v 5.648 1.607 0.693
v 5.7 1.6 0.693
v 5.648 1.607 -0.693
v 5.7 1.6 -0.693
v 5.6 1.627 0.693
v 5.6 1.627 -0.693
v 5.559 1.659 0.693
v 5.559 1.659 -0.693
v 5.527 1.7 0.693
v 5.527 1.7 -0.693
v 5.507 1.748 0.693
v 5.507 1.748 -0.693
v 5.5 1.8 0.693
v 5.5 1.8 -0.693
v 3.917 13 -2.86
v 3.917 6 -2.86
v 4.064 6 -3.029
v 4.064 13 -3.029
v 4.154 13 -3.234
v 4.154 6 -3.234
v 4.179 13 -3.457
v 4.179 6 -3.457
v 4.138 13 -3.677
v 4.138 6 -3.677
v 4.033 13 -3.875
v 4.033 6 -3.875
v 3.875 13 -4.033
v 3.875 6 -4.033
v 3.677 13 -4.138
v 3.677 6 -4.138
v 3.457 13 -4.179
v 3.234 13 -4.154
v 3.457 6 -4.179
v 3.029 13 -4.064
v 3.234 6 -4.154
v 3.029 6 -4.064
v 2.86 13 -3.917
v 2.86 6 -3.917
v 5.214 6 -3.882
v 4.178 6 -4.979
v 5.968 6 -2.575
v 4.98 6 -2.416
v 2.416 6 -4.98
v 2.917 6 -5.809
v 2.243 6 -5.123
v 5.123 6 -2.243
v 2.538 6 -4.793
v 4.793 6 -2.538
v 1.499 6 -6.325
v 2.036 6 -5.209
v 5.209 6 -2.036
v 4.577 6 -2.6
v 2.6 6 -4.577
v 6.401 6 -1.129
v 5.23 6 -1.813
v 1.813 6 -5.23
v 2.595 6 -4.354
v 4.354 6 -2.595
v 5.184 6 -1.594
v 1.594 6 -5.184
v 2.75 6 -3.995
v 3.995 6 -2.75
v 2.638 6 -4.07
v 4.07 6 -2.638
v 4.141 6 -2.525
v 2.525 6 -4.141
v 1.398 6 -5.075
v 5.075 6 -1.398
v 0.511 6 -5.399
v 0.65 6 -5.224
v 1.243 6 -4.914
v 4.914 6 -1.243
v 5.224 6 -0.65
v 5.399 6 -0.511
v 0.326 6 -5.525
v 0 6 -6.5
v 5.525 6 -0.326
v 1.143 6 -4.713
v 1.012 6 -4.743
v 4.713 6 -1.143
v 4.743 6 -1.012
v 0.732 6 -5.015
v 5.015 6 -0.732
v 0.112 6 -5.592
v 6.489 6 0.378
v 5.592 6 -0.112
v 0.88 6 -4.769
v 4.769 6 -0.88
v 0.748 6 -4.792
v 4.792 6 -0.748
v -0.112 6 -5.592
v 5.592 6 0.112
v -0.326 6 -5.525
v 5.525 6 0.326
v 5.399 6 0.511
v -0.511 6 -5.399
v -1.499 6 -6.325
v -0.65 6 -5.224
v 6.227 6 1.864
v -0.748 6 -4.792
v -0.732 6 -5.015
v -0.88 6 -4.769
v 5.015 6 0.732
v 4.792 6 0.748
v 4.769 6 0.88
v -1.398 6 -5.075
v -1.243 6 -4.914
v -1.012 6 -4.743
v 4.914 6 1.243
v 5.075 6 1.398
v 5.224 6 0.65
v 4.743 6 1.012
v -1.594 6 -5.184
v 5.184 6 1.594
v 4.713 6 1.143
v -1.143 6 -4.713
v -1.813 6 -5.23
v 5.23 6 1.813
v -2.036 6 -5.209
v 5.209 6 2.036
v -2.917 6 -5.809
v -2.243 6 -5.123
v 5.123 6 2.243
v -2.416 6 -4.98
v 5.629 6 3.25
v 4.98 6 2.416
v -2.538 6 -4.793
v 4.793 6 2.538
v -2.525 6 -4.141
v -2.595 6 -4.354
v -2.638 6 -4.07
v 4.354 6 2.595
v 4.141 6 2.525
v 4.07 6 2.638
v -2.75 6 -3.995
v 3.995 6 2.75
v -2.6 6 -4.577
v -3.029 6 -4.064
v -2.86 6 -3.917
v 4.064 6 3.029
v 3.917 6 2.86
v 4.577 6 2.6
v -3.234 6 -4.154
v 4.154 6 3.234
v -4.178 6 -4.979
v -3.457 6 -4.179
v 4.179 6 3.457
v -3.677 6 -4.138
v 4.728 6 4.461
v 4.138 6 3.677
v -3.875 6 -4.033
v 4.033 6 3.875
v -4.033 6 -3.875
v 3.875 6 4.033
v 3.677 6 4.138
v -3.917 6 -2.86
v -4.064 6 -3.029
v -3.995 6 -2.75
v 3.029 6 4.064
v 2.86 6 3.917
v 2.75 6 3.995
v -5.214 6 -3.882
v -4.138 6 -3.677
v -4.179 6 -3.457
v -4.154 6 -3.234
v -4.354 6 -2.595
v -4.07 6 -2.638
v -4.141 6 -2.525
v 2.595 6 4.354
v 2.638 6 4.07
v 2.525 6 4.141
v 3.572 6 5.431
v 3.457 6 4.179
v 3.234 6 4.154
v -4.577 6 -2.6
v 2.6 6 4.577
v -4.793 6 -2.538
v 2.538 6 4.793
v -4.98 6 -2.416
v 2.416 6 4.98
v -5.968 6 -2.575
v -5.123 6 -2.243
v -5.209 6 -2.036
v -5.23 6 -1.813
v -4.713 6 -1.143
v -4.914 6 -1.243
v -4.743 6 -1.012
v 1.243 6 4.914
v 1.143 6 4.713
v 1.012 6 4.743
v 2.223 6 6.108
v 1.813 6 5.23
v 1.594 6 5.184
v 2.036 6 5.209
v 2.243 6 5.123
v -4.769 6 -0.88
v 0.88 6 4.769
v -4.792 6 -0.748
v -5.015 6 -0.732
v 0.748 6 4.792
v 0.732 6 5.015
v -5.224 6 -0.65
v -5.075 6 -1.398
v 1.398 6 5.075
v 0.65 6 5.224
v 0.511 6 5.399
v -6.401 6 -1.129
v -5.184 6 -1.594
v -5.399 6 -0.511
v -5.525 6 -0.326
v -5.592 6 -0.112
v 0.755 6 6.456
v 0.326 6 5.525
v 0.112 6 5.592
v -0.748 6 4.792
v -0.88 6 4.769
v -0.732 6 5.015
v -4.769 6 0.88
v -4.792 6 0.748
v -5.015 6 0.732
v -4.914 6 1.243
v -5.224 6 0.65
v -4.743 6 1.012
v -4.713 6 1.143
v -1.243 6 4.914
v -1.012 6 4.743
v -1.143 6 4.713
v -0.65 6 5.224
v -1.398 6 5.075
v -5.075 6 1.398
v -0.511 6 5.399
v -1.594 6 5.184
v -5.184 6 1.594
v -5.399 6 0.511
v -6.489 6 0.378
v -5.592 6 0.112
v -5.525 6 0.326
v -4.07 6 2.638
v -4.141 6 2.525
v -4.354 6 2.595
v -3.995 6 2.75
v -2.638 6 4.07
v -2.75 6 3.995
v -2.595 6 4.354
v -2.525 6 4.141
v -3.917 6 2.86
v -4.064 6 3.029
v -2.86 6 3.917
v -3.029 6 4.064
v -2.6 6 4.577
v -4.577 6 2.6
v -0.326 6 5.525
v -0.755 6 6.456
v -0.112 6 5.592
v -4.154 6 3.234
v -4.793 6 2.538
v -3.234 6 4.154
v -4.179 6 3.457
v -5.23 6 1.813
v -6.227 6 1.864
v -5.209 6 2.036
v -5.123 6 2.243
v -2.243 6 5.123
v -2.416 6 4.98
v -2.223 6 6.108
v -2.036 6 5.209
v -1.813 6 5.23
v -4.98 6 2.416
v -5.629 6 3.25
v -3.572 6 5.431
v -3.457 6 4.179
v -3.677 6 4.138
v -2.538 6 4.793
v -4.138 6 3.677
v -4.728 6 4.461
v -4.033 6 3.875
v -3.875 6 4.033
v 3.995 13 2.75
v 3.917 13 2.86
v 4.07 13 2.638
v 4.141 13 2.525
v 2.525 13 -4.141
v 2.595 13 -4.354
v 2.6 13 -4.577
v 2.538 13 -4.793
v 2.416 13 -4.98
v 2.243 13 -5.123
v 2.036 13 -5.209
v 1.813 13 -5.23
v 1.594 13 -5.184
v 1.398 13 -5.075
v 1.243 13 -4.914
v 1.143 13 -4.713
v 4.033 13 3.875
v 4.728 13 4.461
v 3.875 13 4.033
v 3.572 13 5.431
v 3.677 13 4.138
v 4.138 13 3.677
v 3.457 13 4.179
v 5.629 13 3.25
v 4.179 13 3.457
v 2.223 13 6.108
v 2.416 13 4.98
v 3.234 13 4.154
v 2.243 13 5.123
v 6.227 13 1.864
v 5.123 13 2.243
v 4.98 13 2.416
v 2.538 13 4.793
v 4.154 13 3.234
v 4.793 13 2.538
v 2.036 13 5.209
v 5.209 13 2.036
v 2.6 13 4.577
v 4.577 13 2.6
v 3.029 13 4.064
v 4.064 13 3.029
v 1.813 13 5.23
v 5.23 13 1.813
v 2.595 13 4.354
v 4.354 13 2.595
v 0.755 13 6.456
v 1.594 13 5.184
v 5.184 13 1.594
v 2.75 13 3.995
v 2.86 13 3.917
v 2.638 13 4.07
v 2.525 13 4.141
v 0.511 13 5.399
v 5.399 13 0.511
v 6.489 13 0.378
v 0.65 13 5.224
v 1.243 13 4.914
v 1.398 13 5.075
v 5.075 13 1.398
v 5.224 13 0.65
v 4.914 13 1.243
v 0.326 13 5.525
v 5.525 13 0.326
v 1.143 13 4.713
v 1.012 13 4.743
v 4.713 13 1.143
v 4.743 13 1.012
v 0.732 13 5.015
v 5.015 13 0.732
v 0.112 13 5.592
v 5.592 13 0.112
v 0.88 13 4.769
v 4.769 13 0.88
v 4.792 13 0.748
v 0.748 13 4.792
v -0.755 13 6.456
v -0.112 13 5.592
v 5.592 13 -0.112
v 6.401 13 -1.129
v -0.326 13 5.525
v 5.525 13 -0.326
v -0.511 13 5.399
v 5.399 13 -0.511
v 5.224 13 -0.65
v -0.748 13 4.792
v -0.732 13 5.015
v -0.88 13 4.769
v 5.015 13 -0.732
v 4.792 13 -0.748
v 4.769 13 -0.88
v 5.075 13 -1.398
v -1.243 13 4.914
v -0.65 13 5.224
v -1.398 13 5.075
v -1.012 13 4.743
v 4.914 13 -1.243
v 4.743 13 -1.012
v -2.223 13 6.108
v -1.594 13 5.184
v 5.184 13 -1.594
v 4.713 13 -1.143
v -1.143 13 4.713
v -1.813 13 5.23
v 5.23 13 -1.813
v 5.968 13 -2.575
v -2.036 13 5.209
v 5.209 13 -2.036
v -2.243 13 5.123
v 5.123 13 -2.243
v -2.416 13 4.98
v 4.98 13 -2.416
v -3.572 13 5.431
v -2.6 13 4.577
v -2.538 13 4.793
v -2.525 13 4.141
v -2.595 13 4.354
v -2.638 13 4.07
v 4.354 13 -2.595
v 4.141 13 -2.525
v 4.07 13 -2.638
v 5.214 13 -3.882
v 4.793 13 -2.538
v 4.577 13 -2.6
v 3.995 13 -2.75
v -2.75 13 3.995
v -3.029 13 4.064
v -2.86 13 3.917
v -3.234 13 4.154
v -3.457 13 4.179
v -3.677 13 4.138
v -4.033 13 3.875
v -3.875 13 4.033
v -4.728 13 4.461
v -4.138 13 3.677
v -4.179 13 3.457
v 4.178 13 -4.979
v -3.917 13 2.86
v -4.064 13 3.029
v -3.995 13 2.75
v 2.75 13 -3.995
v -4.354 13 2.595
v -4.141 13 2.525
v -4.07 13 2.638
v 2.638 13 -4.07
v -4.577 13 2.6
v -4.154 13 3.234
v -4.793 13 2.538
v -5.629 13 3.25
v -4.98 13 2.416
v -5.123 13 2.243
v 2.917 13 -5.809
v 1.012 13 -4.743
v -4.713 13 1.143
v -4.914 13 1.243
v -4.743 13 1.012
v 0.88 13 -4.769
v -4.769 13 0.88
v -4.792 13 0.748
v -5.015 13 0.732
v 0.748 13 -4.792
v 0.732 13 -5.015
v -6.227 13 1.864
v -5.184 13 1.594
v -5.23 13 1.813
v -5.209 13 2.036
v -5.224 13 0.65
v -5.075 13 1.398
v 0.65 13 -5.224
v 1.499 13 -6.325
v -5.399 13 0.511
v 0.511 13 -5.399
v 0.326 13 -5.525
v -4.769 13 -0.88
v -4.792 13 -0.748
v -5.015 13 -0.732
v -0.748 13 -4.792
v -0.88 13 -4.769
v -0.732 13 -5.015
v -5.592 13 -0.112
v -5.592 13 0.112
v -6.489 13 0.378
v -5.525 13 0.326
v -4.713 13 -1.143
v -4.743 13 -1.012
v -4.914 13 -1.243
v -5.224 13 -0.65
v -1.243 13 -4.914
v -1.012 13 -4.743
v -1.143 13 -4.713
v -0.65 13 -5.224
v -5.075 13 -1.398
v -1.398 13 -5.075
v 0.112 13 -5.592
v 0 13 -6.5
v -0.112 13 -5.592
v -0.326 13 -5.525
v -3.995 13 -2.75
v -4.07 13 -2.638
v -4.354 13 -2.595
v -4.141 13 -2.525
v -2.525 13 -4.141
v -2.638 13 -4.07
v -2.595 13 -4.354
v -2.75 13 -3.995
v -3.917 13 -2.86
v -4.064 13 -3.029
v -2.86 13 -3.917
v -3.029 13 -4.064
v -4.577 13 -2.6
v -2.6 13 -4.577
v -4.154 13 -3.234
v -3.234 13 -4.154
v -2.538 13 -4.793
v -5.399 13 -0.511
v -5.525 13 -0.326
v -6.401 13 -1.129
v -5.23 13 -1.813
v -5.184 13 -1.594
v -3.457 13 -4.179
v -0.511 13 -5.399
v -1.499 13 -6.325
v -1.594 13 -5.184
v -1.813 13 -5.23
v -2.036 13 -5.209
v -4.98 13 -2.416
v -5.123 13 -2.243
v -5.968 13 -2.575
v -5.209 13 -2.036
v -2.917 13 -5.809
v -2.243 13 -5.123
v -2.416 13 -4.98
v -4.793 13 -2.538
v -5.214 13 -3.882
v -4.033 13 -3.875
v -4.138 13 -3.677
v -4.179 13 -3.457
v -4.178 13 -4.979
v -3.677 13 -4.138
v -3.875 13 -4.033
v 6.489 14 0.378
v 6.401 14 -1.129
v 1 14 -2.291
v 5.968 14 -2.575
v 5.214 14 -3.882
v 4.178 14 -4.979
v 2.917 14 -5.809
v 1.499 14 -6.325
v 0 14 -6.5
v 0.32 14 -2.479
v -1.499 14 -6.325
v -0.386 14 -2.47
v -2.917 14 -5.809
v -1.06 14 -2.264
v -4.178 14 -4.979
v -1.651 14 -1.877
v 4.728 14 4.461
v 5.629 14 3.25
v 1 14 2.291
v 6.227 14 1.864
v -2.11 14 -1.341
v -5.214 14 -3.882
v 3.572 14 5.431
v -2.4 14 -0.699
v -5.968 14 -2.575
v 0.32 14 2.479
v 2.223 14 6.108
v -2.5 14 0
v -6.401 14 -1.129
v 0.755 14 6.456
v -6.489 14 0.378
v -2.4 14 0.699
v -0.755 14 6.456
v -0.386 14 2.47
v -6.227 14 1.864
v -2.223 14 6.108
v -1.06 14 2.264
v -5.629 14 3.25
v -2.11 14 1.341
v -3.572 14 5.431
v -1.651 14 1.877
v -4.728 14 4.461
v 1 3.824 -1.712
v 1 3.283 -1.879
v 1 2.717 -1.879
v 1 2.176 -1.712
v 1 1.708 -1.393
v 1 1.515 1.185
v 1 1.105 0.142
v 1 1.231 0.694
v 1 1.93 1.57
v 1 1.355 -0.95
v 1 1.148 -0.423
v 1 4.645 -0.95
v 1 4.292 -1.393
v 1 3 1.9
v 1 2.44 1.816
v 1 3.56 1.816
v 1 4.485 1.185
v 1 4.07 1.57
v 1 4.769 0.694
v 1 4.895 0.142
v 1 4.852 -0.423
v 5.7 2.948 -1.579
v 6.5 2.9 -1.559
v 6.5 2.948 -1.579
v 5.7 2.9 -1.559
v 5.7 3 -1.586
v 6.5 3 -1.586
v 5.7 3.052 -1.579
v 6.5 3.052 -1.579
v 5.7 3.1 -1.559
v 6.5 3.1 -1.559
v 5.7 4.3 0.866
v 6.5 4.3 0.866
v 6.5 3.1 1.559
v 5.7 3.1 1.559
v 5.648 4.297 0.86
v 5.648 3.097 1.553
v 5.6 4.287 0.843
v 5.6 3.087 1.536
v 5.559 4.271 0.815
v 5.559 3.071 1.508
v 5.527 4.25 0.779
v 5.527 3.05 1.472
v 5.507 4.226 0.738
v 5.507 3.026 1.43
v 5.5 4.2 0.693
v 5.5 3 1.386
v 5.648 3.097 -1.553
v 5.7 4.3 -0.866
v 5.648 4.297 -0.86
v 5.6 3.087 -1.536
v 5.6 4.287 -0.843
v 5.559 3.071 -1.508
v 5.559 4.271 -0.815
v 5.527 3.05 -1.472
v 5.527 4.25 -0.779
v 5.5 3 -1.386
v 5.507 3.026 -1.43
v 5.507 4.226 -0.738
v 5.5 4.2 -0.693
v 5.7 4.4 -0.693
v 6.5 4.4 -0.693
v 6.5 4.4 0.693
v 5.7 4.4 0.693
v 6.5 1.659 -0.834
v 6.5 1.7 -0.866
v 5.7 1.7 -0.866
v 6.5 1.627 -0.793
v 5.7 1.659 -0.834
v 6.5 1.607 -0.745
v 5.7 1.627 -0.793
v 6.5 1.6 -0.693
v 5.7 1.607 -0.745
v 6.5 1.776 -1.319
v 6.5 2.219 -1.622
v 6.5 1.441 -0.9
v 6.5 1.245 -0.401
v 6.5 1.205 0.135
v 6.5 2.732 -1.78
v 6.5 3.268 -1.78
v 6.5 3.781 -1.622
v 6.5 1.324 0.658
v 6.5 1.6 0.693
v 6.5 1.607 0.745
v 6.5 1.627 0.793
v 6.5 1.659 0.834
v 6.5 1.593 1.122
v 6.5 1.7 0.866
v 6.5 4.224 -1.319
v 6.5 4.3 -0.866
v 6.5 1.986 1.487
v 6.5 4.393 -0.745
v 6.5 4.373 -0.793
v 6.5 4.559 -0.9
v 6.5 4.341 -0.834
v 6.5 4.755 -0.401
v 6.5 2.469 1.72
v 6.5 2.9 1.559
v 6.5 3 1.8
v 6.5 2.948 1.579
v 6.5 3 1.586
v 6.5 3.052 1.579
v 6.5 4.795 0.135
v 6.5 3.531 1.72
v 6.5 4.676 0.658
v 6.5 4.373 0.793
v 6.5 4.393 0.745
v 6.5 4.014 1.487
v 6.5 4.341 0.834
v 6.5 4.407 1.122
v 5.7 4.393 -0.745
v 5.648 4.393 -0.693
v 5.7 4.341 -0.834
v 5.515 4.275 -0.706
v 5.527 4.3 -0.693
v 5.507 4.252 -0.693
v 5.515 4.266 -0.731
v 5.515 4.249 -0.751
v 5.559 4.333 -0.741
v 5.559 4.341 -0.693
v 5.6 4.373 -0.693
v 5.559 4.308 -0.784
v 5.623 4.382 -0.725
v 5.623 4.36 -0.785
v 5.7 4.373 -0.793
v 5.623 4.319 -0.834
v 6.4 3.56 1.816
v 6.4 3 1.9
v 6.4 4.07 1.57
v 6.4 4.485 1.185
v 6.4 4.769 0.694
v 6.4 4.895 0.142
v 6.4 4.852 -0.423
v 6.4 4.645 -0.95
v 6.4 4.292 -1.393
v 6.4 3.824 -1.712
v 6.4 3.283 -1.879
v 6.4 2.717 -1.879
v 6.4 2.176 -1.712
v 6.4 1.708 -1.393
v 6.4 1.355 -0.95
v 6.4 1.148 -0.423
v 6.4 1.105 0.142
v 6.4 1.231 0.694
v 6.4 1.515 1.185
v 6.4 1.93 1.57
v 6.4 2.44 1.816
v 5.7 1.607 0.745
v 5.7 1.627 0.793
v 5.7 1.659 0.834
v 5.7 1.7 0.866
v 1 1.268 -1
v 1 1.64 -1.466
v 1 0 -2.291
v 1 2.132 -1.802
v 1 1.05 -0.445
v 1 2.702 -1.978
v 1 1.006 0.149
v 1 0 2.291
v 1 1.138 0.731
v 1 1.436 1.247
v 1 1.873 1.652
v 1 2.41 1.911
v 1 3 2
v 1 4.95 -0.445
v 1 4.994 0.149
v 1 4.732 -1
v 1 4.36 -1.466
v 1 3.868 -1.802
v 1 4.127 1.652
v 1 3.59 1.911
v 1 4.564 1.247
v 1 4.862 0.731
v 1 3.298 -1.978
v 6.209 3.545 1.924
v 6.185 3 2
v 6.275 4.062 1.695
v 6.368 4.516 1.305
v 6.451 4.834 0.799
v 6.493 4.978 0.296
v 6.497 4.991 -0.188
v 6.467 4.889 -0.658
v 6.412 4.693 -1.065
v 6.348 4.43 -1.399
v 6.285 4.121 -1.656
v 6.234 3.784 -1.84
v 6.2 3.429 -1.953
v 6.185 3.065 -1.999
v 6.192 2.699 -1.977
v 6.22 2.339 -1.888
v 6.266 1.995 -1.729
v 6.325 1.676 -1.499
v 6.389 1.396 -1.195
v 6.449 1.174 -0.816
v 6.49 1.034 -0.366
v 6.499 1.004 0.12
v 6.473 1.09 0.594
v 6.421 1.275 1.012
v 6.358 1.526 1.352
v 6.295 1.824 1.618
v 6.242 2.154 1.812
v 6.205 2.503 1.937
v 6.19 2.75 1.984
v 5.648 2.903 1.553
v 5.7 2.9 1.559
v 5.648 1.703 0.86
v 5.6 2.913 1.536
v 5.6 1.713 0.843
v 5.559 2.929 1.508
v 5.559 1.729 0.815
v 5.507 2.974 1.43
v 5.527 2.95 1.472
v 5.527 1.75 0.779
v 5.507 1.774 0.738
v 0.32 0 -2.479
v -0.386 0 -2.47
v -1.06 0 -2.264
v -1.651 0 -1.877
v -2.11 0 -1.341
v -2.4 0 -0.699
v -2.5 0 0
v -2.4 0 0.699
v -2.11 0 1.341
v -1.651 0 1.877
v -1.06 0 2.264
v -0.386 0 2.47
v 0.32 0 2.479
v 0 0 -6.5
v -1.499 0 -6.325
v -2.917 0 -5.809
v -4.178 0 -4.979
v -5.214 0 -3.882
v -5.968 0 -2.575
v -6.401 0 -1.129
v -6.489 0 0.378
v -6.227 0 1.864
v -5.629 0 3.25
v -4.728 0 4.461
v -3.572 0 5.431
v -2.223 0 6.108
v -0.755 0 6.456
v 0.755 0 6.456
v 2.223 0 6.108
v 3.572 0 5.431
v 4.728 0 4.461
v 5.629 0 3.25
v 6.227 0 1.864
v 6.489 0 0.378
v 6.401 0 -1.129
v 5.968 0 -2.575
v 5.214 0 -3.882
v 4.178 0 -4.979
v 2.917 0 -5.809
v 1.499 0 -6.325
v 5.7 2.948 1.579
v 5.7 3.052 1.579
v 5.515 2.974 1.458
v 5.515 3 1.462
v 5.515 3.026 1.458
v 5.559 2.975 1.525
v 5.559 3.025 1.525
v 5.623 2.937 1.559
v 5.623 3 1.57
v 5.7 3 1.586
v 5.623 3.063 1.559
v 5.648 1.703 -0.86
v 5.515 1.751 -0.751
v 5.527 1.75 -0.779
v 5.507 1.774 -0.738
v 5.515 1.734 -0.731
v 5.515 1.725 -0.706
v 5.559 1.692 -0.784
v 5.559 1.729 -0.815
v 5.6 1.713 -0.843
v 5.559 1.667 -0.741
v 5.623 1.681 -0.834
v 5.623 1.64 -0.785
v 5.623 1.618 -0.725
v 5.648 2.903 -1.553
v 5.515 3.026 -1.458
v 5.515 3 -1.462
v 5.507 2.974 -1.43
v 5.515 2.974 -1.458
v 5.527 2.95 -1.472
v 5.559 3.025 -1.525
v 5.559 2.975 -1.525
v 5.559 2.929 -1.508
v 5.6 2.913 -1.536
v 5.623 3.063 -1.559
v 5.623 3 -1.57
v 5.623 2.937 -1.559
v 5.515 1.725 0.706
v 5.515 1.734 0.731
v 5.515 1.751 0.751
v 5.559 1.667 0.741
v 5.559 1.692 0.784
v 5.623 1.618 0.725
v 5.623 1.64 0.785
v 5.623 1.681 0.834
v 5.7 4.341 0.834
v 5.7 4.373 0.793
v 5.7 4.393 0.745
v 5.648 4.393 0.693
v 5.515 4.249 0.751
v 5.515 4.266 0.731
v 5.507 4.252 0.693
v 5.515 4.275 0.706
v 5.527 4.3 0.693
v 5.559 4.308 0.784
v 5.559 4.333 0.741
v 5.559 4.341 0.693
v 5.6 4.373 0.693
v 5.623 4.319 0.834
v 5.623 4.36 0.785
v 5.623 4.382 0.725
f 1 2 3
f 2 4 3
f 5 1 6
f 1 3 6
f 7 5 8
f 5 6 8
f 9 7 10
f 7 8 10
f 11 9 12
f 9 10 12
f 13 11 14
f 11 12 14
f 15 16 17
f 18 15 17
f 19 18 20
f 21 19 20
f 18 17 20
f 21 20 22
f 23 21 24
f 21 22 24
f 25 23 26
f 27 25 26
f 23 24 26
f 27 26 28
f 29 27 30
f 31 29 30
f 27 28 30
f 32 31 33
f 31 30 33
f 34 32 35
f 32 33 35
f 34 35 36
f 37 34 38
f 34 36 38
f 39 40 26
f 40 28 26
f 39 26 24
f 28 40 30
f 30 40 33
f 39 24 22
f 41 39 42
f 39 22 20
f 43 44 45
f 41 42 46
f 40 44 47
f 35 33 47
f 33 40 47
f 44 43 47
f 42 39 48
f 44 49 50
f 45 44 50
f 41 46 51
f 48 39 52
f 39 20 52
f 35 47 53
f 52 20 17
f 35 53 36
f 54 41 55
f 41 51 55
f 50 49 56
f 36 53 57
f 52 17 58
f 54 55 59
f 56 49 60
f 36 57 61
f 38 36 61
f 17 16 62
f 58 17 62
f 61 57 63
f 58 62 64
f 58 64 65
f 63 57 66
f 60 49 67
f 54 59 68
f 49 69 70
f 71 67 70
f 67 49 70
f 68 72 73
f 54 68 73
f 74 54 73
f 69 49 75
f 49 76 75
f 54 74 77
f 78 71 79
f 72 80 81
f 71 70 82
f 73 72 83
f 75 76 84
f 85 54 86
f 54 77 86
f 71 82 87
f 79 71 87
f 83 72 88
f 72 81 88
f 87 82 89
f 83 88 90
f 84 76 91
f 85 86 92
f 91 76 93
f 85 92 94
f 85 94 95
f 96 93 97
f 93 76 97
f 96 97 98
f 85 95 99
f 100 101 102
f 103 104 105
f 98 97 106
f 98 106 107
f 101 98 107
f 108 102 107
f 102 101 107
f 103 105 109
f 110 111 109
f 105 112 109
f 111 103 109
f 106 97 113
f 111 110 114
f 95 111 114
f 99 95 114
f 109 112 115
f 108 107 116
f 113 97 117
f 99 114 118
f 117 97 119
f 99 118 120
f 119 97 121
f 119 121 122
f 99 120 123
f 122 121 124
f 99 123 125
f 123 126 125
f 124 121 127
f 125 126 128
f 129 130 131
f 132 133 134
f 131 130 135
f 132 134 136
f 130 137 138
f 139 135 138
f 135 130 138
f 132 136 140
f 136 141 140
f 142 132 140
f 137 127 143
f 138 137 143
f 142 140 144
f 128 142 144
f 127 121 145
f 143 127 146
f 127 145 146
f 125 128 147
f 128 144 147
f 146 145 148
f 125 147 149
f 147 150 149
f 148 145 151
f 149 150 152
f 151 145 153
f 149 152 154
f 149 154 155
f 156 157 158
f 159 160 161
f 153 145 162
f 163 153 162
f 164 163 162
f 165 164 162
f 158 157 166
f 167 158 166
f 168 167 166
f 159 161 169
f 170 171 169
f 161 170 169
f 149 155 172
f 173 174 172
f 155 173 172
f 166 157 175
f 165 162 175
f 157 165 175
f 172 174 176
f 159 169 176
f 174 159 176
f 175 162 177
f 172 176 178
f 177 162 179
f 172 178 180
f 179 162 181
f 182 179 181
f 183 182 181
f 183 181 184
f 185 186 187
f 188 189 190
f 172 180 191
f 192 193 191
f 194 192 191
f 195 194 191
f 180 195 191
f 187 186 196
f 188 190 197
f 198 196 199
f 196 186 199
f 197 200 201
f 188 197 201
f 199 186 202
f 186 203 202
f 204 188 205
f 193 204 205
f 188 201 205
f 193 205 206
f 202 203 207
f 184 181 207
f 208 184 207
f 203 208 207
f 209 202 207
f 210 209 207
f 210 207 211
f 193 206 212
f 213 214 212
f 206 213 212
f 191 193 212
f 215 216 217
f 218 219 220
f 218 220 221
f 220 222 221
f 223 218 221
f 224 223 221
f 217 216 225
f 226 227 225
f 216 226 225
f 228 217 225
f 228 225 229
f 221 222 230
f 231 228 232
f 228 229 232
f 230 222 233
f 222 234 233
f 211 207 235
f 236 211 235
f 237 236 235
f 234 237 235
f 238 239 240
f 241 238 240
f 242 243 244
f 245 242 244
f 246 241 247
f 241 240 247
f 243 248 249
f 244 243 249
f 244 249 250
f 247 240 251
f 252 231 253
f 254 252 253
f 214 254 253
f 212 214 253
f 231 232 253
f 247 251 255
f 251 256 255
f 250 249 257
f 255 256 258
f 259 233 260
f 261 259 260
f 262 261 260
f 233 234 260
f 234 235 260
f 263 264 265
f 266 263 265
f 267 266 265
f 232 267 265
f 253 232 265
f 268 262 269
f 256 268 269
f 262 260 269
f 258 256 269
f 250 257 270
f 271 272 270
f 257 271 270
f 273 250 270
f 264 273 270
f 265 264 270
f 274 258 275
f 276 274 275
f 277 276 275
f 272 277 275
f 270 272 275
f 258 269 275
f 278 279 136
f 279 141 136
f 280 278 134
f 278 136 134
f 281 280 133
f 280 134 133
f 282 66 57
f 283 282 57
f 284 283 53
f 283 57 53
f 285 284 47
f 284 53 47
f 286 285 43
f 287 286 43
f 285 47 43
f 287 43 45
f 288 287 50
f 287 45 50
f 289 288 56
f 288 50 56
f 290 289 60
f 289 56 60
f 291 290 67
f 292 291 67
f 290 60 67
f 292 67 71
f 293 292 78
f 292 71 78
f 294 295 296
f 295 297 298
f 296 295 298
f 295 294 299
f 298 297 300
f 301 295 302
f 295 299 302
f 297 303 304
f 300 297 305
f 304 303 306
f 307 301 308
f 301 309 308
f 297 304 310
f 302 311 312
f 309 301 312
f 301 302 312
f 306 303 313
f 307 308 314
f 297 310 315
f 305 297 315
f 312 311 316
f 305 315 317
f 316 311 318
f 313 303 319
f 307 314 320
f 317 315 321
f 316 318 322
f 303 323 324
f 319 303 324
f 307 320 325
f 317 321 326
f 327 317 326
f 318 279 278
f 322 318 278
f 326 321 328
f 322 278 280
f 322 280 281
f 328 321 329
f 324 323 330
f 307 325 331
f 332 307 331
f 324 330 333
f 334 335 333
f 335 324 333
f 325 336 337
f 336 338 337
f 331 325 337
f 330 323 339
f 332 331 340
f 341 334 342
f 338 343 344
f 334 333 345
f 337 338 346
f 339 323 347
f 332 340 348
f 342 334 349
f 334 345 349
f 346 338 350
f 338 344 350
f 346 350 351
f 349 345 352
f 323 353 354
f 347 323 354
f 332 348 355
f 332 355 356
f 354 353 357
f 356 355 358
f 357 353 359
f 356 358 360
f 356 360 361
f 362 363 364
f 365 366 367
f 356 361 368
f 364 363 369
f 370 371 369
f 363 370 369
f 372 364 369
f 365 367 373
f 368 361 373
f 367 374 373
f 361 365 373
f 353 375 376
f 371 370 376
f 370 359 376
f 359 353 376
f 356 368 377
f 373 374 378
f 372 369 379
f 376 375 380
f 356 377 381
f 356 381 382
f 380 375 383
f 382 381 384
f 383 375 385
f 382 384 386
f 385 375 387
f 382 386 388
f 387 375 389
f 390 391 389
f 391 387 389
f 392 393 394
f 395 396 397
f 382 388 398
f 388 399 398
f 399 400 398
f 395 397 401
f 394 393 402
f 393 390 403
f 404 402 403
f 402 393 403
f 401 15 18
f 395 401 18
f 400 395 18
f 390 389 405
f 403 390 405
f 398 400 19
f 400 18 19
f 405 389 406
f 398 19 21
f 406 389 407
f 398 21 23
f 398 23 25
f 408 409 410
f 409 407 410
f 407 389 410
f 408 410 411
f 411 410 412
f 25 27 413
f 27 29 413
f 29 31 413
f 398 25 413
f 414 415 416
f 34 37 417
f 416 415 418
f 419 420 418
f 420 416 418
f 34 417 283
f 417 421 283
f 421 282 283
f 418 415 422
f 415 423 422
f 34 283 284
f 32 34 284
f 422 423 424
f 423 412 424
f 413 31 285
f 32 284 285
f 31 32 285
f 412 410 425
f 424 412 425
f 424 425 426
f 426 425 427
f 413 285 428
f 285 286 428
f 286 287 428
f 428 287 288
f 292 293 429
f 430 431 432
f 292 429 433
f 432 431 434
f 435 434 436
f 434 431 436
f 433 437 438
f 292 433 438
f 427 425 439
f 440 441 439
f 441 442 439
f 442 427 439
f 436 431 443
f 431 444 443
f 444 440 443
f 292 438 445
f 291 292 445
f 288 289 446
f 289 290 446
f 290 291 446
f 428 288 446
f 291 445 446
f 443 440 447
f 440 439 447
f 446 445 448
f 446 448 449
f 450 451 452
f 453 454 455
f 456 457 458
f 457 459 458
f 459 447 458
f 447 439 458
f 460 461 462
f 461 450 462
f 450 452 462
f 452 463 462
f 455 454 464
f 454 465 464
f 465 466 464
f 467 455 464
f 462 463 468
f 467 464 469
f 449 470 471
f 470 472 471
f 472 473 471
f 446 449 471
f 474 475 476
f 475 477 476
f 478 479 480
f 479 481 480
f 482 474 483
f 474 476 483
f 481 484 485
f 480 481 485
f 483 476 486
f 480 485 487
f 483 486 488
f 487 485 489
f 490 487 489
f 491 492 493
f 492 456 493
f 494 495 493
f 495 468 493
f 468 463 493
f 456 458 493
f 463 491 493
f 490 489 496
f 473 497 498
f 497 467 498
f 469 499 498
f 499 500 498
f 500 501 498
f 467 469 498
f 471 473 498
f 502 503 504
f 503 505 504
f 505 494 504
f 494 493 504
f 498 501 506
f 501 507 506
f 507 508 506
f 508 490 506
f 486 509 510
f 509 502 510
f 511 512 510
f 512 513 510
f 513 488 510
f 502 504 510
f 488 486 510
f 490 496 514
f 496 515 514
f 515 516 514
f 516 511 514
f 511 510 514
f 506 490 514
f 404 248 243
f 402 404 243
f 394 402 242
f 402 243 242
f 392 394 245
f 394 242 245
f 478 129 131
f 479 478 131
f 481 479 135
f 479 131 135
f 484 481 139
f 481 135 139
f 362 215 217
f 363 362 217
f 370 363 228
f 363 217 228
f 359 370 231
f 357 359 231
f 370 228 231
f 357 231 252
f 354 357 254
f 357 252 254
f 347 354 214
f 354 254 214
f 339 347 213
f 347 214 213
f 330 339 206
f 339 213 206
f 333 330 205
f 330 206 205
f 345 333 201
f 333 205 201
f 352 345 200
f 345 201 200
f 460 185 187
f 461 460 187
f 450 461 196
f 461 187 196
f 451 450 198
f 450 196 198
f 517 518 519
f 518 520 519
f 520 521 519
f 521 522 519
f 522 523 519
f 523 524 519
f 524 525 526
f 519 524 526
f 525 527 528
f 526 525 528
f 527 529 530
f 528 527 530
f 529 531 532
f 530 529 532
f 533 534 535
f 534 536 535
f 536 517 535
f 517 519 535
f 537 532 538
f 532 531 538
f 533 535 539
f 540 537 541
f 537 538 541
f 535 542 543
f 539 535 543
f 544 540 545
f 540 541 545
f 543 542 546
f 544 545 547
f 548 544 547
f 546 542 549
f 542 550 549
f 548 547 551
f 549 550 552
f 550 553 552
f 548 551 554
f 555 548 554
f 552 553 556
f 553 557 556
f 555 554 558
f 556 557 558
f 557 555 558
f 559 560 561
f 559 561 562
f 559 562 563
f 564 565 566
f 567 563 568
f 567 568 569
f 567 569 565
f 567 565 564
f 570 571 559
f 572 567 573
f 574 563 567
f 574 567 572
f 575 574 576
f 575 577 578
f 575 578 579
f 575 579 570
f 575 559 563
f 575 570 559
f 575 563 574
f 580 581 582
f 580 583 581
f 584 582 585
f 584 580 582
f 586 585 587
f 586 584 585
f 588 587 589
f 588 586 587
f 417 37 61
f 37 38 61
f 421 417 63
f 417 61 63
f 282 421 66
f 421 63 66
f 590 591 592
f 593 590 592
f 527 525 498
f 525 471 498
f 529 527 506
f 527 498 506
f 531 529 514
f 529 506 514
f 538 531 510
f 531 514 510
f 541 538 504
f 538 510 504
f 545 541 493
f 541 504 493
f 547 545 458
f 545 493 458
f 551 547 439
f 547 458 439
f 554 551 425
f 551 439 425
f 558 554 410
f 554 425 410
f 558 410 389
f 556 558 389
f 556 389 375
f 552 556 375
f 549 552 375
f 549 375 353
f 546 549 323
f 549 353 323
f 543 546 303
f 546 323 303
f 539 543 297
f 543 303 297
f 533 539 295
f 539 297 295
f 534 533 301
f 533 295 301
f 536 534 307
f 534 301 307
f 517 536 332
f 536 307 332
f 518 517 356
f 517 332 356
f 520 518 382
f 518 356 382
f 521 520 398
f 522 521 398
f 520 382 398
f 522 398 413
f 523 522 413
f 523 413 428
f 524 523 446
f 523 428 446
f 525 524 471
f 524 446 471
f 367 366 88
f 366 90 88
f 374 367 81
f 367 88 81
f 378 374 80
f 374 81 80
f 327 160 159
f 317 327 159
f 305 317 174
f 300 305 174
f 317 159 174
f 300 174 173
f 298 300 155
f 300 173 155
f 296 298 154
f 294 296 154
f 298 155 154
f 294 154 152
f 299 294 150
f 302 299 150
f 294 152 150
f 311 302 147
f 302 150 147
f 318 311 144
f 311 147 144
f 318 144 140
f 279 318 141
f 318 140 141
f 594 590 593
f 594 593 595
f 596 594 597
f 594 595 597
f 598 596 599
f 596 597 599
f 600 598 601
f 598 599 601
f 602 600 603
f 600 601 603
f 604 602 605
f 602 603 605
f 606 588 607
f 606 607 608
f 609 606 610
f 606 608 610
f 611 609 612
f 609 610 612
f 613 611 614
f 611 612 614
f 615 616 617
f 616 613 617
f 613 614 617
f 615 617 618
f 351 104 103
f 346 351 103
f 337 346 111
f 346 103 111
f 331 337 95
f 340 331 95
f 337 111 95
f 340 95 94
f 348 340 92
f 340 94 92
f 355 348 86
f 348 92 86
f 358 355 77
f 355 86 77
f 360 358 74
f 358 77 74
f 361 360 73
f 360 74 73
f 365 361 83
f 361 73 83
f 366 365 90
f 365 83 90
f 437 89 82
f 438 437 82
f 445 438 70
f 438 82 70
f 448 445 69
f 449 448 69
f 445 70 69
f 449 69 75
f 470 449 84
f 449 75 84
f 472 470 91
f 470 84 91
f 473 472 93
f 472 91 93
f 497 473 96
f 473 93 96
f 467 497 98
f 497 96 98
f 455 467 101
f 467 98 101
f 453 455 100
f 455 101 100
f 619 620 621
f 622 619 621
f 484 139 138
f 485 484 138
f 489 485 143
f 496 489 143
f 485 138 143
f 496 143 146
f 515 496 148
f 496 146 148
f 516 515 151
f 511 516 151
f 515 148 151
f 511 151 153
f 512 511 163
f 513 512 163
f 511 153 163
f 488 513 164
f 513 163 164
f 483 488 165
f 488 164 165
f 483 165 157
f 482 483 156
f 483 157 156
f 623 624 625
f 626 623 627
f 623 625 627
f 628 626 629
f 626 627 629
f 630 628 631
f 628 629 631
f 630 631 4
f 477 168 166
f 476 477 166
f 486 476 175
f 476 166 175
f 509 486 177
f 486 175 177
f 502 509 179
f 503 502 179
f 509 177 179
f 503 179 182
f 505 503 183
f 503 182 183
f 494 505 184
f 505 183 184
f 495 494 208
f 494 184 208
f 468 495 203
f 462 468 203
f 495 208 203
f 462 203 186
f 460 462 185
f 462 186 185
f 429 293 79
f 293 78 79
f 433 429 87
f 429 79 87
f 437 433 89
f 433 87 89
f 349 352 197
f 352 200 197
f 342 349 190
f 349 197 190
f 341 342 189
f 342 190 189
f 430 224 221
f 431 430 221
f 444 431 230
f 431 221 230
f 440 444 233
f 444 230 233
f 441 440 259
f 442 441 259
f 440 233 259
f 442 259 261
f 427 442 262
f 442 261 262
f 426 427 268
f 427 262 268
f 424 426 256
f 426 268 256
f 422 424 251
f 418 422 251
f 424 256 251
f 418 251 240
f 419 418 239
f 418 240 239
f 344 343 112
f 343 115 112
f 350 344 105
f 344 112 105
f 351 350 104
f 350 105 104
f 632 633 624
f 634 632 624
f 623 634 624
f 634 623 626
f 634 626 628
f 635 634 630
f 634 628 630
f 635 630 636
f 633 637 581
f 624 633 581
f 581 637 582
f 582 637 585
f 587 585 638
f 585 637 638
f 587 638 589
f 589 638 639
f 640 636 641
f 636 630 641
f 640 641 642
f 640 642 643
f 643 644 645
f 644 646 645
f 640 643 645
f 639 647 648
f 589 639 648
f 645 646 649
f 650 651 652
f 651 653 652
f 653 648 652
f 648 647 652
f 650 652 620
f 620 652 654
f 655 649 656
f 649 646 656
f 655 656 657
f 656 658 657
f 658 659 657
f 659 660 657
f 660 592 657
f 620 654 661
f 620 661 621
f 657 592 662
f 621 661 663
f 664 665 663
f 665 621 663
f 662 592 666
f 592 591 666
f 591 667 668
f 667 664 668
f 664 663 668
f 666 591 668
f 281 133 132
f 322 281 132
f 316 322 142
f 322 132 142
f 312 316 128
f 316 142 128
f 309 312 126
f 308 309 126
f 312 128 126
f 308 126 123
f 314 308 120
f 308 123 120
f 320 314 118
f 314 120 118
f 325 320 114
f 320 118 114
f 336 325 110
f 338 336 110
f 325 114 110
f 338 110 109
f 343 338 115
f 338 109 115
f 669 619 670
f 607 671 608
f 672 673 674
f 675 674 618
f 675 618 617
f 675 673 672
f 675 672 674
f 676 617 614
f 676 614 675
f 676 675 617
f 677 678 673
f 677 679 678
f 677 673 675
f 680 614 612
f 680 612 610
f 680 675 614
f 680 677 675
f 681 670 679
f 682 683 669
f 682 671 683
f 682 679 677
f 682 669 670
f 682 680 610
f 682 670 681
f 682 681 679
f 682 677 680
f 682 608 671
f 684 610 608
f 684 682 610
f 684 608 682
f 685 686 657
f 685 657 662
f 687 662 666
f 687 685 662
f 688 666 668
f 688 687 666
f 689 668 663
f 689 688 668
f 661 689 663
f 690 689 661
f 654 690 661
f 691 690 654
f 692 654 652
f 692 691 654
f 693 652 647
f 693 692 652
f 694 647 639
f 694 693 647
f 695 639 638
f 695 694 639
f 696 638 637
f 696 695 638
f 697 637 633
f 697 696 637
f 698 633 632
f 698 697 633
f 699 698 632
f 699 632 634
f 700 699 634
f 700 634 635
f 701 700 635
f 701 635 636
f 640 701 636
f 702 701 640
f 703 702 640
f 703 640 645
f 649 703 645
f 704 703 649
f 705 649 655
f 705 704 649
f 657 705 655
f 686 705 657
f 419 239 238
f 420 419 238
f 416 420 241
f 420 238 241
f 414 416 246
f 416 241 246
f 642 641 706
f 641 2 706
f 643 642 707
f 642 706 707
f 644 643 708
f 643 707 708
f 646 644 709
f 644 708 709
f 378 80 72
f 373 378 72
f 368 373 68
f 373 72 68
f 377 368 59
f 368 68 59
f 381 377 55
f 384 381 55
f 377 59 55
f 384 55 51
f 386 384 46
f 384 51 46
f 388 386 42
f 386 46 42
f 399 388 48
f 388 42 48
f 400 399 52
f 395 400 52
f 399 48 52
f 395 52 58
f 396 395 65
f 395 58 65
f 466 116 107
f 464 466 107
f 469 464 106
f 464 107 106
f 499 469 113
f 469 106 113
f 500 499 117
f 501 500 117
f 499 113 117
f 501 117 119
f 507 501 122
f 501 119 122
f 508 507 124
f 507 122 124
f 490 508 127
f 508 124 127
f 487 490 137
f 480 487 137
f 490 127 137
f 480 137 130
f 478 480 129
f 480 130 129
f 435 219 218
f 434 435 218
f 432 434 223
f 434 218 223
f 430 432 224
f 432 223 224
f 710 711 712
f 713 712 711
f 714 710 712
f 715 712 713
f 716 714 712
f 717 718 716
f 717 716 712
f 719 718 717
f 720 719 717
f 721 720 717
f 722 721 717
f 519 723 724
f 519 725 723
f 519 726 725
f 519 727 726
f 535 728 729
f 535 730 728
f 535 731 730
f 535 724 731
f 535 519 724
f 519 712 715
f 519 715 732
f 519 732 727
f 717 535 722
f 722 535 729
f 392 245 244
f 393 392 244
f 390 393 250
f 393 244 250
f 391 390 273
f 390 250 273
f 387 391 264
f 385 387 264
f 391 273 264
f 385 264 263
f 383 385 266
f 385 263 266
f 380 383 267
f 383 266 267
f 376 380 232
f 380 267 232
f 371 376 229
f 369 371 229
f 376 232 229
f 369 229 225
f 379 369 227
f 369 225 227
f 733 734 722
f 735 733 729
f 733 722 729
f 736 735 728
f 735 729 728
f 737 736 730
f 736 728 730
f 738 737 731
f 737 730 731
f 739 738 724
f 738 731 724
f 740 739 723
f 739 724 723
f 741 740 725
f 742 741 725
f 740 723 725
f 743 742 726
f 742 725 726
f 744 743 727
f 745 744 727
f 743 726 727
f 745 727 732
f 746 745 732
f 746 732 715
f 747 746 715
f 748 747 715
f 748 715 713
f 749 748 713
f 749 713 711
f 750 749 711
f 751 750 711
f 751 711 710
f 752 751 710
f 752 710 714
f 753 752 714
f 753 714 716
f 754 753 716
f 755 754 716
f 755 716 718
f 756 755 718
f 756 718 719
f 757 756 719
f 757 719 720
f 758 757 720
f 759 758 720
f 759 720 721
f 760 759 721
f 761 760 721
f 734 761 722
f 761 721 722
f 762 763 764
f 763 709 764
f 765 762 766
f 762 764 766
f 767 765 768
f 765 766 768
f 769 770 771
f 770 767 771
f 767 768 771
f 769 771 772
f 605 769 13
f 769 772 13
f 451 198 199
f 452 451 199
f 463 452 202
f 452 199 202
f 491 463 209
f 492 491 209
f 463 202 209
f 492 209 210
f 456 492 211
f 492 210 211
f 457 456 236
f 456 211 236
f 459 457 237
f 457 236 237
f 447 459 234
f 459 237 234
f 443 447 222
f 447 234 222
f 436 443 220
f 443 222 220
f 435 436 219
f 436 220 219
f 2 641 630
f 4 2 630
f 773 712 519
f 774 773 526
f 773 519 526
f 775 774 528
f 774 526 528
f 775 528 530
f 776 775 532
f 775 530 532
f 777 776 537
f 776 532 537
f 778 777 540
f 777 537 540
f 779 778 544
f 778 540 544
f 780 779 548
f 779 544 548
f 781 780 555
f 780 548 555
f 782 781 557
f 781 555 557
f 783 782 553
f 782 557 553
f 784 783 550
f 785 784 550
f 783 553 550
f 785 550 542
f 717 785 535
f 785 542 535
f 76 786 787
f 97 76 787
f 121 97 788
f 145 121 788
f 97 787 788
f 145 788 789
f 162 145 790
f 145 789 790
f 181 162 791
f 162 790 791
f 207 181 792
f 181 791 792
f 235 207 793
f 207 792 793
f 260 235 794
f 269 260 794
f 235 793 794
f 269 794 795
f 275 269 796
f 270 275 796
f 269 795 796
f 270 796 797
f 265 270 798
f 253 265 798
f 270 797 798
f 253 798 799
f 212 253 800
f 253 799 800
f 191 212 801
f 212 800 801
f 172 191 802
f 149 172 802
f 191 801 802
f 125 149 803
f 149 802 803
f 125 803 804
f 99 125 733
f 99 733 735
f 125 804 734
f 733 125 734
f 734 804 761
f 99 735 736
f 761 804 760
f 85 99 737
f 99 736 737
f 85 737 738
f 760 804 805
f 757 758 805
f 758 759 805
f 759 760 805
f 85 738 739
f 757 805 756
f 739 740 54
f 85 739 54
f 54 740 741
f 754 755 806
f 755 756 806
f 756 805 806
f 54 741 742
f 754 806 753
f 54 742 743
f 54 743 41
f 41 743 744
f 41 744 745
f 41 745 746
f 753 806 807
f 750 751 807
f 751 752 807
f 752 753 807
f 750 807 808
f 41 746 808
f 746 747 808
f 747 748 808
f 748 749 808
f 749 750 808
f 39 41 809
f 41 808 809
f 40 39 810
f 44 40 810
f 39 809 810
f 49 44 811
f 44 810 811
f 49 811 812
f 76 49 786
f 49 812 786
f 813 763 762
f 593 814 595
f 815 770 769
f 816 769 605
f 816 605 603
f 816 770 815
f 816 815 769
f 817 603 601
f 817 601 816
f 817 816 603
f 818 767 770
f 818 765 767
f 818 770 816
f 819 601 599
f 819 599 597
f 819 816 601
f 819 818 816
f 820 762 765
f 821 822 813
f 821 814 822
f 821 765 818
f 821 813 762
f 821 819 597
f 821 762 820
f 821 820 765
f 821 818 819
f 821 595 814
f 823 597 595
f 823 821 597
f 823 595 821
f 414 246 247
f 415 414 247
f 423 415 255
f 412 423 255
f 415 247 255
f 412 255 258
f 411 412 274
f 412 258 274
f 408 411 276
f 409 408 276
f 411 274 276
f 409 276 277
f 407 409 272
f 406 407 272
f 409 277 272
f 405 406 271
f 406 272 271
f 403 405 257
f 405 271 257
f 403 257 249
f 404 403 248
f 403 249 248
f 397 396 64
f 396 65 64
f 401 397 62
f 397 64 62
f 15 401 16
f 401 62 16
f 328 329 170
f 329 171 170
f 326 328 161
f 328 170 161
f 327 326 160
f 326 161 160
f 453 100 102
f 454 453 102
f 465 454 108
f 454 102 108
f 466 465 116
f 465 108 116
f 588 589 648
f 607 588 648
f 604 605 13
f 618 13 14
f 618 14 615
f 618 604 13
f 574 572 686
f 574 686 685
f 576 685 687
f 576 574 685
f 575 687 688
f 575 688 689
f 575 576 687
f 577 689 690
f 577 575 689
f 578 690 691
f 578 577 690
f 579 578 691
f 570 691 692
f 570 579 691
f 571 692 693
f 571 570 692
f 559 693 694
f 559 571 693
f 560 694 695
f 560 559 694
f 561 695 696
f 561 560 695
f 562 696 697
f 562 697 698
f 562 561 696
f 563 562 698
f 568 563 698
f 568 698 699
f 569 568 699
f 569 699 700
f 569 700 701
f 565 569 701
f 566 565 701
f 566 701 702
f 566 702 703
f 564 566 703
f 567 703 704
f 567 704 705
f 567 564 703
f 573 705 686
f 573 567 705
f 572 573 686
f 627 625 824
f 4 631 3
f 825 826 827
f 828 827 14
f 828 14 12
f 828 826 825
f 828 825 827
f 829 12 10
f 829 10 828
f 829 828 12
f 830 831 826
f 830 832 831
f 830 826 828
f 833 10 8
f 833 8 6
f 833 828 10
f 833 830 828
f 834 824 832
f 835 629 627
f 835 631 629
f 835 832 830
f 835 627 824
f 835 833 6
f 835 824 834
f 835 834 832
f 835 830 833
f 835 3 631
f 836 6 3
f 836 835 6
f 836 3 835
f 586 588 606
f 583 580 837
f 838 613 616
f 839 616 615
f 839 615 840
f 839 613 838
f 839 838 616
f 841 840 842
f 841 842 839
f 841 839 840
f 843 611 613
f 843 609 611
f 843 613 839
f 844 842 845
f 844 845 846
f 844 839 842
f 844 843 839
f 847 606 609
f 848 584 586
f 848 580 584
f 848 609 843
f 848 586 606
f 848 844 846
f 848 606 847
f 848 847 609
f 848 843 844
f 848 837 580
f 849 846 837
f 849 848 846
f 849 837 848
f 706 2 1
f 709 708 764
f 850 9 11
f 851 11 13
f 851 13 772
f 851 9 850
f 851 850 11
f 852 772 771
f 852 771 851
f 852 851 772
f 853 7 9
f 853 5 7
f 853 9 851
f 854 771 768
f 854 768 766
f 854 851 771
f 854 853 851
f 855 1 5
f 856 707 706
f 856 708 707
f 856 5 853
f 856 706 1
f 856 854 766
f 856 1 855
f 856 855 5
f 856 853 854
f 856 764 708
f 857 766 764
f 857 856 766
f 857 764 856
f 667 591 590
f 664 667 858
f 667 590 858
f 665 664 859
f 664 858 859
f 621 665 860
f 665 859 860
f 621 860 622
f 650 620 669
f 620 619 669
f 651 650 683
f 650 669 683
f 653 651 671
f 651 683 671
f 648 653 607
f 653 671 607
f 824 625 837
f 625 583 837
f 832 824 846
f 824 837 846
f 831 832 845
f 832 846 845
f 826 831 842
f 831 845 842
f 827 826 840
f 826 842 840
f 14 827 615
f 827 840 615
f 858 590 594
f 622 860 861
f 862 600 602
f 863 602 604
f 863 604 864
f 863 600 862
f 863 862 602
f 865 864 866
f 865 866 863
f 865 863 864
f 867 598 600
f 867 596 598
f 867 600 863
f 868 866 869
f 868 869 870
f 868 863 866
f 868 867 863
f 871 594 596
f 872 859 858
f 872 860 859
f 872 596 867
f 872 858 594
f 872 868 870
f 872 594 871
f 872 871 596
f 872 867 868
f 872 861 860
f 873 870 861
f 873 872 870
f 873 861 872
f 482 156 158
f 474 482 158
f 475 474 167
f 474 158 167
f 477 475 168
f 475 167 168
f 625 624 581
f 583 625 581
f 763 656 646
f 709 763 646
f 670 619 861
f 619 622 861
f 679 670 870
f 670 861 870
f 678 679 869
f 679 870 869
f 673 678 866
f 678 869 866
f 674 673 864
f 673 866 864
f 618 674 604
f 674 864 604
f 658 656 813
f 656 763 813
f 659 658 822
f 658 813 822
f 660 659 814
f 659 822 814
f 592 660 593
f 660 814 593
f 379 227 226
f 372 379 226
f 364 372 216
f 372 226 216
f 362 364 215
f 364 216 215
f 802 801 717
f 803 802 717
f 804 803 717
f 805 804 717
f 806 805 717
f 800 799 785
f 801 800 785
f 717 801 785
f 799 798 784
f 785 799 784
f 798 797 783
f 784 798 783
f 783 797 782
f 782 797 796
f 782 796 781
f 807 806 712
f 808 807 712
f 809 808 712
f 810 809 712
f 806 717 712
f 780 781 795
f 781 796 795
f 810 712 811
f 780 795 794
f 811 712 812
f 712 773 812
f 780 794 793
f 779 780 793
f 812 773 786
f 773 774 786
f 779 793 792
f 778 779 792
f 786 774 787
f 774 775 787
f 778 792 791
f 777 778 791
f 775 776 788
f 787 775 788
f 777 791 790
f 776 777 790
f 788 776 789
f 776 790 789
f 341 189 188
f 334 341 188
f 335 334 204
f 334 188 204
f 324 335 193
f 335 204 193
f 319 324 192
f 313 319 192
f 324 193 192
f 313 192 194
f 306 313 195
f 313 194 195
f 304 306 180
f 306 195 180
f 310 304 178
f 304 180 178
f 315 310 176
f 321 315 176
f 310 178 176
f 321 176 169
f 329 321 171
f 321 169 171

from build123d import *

# Parameters (mm, degrees)
BOSS_EXTRUDE1_DEPTH = 7
BOSS_EXTRUDE2_START = 14
BOSS_EXTRUDE2_DEPTH = 14
SKETCH4_R           = 2
CUT_EXTRUDE1_DEPTH  = 18.161002302
SKETCH5_R           = 1.9
BOSS_EXTRUDE3_DEPTH = 5.5
CUT_EXTRUDE2_DEPTH  = 1
FILLET1_R           = 0.2
CHAMFER1_SIZE       = 0.1


with BuildPart() as part:
    # Sketch1 → Revolve1 (revolve)
    with BuildSketch(Plane.XY, mode=Mode.PRIVATE) as revolve1_sk:
        Polygon((2.5, 0), (2.5, 14), (6.5, 14), (6.5, 13), (4.85, 13), (4.85, 6), (6.5, 6), (6.5, 0), align=None)
    revolve(revolve1_sk.sketch.rotate(Axis((0, 0, 0), (0, 1, 0)), 90), axis=Axis((0, 0, 0), (0, 1, 0)))

    # Sketch2 → Boss-Extrude1 (add)
    with BuildSketch(Plane(origin=(0, 6, 0), x_dir=(1, 0, 0), z_dir=(0, 1, 0))):
        with BuildLine():
            ThreePointArc((4.792010309, 0.74775477), (4.85, 0), (4.792010309, -0.74775477))
            ThreePointArc((4.792010309, -0.74775477), (5.6, 0), (4.792010309, 0.74775477))
        make_face()
        with BuildLine():
            ThreePointArc((4.141086882, 2.52465828), (4.480815733, 1.856014647), (4.713393606, 1.142987626))
            ThreePointArc((4.713393606, 1.142987626), (5.173725382, 2.143027221), (4.141086882, 2.52465828))
        make_face()
        with BuildLine():
            ThreePointArc((4.141086882, -2.52465828), (5.173725382, -2.143027221), (4.713393606, -1.142987626))
            ThreePointArc((4.713393606, -1.142987626), (4.480815733, -1.856014647), (4.141086882, -2.52465828))
        make_face()
        with BuildLine():
            ThreePointArc((2.859720517, 3.917205454), (3.429467889, 3.429467889), (3.917205454, 2.859720517))
            ThreePointArc((3.917205454, 2.859720517), (3.959797975, 3.959797975), (2.859720517, 3.917205454))
        make_face()
        with BuildLine():
            ThreePointArc((2.859720517, -3.917205454), (3.959797975, -3.959797975), (3.917205454, -2.859720517))
            ThreePointArc((3.917205454, -2.859720517), (3.429467889, -3.429467889), (2.859720517, -3.917205454))
        make_face()
        with BuildLine():
            ThreePointArc((1.142987626, 4.713393606), (1.856014647, 4.480815733), (2.52465828, 4.141086882))
            ThreePointArc((2.52465828, 4.141086882), (2.143027221, 5.173725382), (1.142987626, 4.713393606))
        make_face()
        with BuildLine():
            ThreePointArc((1.142987626, -4.713393606), (2.143027221, -5.173725382), (2.52465828, -4.141086882))
            ThreePointArc((2.52465828, -4.141086882), (1.856014647, -4.480815733), (1.142987626, -4.713393606))
        make_face()
        with BuildLine():
            ThreePointArc((-0.74775477, 4.792010309), (0, 4.85), (0.74775477, 4.792010309))
            ThreePointArc((0.74775477, 4.792010309), (0, 5.6), (-0.74775477, 4.792010309))
        make_face()
        with BuildLine():
            ThreePointArc((-0.74775477, -4.792010309), (0, -5.6), (0.74775477, -4.792010309))
            ThreePointArc((0.74775477, -4.792010309), (0, -4.85), (-0.74775477, -4.792010309))
        make_face()
        with BuildLine():
            ThreePointArc((-2.52465828, 4.141086882), (-1.856014647, 4.480815733), (-1.142987626, 4.713393606))
            ThreePointArc((-1.142987626, 4.713393606), (-2.143027221, 5.173725382), (-2.52465828, 4.141086882))
        make_face()
        with BuildLine():
            ThreePointArc((-2.52465828, -4.141086882), (-2.143027221, -5.173725382), (-1.142987626, -4.713393606))
            ThreePointArc((-1.142987626, -4.713393606), (-1.856014647, -4.480815733), (-2.52465828, -4.141086882))
        make_face()
        with BuildLine():
            ThreePointArc((-3.917205454, 2.859720517), (-3.429467889, 3.429467889), (-2.859720517, 3.917205454))
            ThreePointArc((-2.859720517, 3.917205454), (-3.959797975, 3.959797975), (-3.917205454, 2.859720517))
        make_face()
        with BuildLine():
            ThreePointArc((-3.917205454, -2.859720517), (-3.959797975, -3.959797975), (-2.859720517, -3.917205454))
            ThreePointArc((-2.859720517, -3.917205454), (-3.429467889, -3.429467889), (-3.917205454, -2.859720517))
        make_face()
        with BuildLine():
            ThreePointArc((-4.713393606, 1.142987626), (-4.480815733, 1.856014647), (-4.141086882, 2.52465828))
            ThreePointArc((-4.141086882, 2.52465828), (-5.173725382, 2.143027221), (-4.713393606, 1.142987626))
        make_face()
        with BuildLine():
            ThreePointArc((-4.713393606, -1.142987626), (-5.173725382, -2.143027221), (-4.141086882, -2.52465828))
            ThreePointArc((-4.141086882, -2.52465828), (-4.480815733, -1.856014647), (-4.713393606, -1.142987626))
        make_face()
        with BuildLine():
            ThreePointArc((-4.792010309, -0.74775477), (-4.85, 0), (-4.792010309, 0.74775477))
            ThreePointArc((-4.792010309, 0.74775477), (-5.6, 0), (-4.792010309, -0.74775477))
        make_face()
    extrude(amount=BOSS_EXTRUDE1_DEPTH)

    # Sketch3 → Boss-Extrude2 (add)
    with BuildSketch(Plane(origin=(0, 0, 0), x_dir=(1, 0, 0), z_dir=(0, 1, 0)).offset(BOSS_EXTRUDE2_START)):
        with BuildLine():
            Line((1, 2.291287847), (1, -2.291287847))
            ThreePointArc((1, -2.291287847), (2.5, 0), (1, 2.291287847))
        make_face()
    extrude(amount=-BOSS_EXTRUDE2_DEPTH)

    # Sketch4 → Cut-Extrude1 (cut, through all)
    with BuildSketch(Plane.ZY.offset(-1)):
        with Locations((0, 3)):
            Circle(SKETCH4_R)
    extrude(amount=-CUT_EXTRUDE1_DEPTH, mode=Mode.SUBTRACT)


with BuildPart() as body_2:
    # Sketch5 → Boss-Extrude3 (new body)
    with BuildSketch(Plane.ZY.offset(-1)):
        with Locations((0, 3)):
            Circle(SKETCH5_R)
    extrude(amount=-BOSS_EXTRUDE3_DEPTH)

    # Sketch6 → Cut-Extrude2 (cut)
    with BuildSketch(Plane(origin=(6.5, 0, 0), x_dir=(0, 0, -1), z_dir=(1, 0, 0))):
        Polygon((1.616580754, 3), (0.808290377, 4.4), (-0.808290377, 4.4), (-1.616580754, 3), (-0.808290377, 1.6), (0.808290377, 1.6), align=None)
    extrude(amount=-CUT_EXTRUDE2_DEPTH, mode=Mode.SUBTRACT)

    # Fillet1
    fillet1_edges = [body_2.edges().sort_by_distance(p)[0] for p in [
        (6, 3, 1.616580754),
        (5.5, 4.4, 0),
        (6, 4.4, 0.808290377),
        (5.5, 3.7, -1.212435565),
        (6, 4.4, -0.808290377),
        (5.5, 2.3, -1.212435565),
        (6, 3, -1.616580754),
        (5.5, 1.6, 0),
        (6, 1.6, -0.808290377),
        (5.5, 2.3, 1.212435565),
        (6, 1.6, 0.808290377),
        (5.5, 3.7, 1.212435565),
    ]]
    fillet(fillet1_edges, radius=FILLET1_R)

    # Chamfer1
    chamfer1_edges = [body_2.edges().sort_by_distance(p)[0] for p in [
        (6.5, 3, -1.9),
    ]]
    chamfer(chamfer1_edges, length=CHAMFER1_SIZE)


solid = Compound([part.part, body_2.part])
